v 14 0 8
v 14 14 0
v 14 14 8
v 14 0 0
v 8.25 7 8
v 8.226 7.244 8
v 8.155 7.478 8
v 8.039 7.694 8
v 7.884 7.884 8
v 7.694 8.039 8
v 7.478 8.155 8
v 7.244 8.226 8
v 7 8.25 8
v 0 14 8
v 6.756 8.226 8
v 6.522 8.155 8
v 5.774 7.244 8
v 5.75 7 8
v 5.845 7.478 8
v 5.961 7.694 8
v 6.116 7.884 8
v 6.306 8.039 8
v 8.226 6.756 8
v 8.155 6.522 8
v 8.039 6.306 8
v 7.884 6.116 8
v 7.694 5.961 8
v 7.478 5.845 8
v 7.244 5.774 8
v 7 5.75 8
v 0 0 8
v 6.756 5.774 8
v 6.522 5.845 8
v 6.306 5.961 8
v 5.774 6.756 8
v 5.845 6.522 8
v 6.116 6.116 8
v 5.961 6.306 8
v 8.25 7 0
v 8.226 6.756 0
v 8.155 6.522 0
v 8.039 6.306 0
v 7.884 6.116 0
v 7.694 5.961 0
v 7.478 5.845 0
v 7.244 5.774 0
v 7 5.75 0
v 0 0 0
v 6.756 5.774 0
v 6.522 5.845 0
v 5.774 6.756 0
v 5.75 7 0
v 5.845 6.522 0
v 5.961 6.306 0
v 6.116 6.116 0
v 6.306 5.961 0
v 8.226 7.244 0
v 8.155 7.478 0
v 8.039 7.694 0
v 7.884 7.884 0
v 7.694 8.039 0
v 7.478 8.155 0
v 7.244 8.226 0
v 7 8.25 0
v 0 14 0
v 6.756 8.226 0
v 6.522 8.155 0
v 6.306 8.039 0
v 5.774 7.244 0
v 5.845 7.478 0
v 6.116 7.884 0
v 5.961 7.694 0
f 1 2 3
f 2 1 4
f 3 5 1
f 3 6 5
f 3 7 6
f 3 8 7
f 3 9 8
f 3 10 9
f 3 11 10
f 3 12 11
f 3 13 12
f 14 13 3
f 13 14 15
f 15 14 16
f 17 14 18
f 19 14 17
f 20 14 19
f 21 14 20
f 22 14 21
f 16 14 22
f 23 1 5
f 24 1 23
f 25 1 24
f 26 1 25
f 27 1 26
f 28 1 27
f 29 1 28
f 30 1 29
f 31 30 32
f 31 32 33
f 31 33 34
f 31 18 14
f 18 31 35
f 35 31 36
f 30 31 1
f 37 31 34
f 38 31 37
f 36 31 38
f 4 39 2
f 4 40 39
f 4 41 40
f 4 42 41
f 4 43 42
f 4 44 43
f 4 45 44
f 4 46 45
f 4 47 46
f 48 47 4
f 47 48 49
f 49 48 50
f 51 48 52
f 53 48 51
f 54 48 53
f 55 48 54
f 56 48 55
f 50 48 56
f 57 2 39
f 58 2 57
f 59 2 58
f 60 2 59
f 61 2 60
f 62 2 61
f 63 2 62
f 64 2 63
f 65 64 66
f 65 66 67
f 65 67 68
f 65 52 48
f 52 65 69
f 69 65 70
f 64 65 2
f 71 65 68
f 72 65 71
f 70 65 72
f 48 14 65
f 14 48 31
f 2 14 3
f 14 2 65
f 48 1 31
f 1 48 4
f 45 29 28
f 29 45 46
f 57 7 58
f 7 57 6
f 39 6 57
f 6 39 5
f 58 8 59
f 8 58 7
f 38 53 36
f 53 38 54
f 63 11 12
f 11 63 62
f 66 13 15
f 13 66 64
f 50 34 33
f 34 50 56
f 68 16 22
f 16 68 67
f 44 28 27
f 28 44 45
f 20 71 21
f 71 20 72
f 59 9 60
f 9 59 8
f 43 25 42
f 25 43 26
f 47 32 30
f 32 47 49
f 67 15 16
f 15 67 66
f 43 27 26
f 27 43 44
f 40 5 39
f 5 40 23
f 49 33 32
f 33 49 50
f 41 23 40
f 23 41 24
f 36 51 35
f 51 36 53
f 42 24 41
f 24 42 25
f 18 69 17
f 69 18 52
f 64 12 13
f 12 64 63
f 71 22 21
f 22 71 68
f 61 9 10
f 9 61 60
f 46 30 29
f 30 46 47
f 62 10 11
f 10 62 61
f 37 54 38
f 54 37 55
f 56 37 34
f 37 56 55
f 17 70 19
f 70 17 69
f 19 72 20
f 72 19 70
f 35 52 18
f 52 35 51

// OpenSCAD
$fn = 32;

// ----------------------------------------------------------------------
// Micro pad: drilled pad, 5-20 mm class
// ----------------------------------------------------------------------

// --- parameters (mm) ---
pad_l = 14;               // pad length, X
pad_w = 14;               // pad width, Y
pad_t = 8;                // pad thickness, Z
hole_d = 2.5;             // through hole diameter
fit_tol = 0.02;           // tolerance for press fits, mm
free_tol = 0.2;           // tolerance for clearance fits, mm

difference() {
  cube([pad_l, pad_w, pad_t]);
  translate([pad_l / 2, pad_w / 2, -1])
    cylinder(h = pad_t + 2, d = hole_d);
}
